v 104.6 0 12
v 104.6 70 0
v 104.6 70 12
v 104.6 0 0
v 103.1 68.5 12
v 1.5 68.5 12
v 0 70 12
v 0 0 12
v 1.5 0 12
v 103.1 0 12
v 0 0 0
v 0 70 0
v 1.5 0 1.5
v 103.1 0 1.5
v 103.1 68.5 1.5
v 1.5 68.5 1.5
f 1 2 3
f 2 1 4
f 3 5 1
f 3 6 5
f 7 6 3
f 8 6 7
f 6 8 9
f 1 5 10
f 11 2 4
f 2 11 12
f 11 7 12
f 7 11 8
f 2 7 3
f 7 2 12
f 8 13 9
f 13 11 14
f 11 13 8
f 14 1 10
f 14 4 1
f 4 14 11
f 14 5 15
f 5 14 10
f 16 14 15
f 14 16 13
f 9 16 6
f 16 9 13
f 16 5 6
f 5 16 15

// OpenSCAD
x = 4*25.4;
y = 68;
height = 12;
thickness = 1.5;
xspace = 3;
yspace = 2;

intx = x + xspace;
inty = y + yspace;

difference() {
    cube([intx, inty, height]);
    translate([thickness,0,thickness]) {
        cube([intx-thickness*2, inty-thickness, height-thickness]);
    }
}
